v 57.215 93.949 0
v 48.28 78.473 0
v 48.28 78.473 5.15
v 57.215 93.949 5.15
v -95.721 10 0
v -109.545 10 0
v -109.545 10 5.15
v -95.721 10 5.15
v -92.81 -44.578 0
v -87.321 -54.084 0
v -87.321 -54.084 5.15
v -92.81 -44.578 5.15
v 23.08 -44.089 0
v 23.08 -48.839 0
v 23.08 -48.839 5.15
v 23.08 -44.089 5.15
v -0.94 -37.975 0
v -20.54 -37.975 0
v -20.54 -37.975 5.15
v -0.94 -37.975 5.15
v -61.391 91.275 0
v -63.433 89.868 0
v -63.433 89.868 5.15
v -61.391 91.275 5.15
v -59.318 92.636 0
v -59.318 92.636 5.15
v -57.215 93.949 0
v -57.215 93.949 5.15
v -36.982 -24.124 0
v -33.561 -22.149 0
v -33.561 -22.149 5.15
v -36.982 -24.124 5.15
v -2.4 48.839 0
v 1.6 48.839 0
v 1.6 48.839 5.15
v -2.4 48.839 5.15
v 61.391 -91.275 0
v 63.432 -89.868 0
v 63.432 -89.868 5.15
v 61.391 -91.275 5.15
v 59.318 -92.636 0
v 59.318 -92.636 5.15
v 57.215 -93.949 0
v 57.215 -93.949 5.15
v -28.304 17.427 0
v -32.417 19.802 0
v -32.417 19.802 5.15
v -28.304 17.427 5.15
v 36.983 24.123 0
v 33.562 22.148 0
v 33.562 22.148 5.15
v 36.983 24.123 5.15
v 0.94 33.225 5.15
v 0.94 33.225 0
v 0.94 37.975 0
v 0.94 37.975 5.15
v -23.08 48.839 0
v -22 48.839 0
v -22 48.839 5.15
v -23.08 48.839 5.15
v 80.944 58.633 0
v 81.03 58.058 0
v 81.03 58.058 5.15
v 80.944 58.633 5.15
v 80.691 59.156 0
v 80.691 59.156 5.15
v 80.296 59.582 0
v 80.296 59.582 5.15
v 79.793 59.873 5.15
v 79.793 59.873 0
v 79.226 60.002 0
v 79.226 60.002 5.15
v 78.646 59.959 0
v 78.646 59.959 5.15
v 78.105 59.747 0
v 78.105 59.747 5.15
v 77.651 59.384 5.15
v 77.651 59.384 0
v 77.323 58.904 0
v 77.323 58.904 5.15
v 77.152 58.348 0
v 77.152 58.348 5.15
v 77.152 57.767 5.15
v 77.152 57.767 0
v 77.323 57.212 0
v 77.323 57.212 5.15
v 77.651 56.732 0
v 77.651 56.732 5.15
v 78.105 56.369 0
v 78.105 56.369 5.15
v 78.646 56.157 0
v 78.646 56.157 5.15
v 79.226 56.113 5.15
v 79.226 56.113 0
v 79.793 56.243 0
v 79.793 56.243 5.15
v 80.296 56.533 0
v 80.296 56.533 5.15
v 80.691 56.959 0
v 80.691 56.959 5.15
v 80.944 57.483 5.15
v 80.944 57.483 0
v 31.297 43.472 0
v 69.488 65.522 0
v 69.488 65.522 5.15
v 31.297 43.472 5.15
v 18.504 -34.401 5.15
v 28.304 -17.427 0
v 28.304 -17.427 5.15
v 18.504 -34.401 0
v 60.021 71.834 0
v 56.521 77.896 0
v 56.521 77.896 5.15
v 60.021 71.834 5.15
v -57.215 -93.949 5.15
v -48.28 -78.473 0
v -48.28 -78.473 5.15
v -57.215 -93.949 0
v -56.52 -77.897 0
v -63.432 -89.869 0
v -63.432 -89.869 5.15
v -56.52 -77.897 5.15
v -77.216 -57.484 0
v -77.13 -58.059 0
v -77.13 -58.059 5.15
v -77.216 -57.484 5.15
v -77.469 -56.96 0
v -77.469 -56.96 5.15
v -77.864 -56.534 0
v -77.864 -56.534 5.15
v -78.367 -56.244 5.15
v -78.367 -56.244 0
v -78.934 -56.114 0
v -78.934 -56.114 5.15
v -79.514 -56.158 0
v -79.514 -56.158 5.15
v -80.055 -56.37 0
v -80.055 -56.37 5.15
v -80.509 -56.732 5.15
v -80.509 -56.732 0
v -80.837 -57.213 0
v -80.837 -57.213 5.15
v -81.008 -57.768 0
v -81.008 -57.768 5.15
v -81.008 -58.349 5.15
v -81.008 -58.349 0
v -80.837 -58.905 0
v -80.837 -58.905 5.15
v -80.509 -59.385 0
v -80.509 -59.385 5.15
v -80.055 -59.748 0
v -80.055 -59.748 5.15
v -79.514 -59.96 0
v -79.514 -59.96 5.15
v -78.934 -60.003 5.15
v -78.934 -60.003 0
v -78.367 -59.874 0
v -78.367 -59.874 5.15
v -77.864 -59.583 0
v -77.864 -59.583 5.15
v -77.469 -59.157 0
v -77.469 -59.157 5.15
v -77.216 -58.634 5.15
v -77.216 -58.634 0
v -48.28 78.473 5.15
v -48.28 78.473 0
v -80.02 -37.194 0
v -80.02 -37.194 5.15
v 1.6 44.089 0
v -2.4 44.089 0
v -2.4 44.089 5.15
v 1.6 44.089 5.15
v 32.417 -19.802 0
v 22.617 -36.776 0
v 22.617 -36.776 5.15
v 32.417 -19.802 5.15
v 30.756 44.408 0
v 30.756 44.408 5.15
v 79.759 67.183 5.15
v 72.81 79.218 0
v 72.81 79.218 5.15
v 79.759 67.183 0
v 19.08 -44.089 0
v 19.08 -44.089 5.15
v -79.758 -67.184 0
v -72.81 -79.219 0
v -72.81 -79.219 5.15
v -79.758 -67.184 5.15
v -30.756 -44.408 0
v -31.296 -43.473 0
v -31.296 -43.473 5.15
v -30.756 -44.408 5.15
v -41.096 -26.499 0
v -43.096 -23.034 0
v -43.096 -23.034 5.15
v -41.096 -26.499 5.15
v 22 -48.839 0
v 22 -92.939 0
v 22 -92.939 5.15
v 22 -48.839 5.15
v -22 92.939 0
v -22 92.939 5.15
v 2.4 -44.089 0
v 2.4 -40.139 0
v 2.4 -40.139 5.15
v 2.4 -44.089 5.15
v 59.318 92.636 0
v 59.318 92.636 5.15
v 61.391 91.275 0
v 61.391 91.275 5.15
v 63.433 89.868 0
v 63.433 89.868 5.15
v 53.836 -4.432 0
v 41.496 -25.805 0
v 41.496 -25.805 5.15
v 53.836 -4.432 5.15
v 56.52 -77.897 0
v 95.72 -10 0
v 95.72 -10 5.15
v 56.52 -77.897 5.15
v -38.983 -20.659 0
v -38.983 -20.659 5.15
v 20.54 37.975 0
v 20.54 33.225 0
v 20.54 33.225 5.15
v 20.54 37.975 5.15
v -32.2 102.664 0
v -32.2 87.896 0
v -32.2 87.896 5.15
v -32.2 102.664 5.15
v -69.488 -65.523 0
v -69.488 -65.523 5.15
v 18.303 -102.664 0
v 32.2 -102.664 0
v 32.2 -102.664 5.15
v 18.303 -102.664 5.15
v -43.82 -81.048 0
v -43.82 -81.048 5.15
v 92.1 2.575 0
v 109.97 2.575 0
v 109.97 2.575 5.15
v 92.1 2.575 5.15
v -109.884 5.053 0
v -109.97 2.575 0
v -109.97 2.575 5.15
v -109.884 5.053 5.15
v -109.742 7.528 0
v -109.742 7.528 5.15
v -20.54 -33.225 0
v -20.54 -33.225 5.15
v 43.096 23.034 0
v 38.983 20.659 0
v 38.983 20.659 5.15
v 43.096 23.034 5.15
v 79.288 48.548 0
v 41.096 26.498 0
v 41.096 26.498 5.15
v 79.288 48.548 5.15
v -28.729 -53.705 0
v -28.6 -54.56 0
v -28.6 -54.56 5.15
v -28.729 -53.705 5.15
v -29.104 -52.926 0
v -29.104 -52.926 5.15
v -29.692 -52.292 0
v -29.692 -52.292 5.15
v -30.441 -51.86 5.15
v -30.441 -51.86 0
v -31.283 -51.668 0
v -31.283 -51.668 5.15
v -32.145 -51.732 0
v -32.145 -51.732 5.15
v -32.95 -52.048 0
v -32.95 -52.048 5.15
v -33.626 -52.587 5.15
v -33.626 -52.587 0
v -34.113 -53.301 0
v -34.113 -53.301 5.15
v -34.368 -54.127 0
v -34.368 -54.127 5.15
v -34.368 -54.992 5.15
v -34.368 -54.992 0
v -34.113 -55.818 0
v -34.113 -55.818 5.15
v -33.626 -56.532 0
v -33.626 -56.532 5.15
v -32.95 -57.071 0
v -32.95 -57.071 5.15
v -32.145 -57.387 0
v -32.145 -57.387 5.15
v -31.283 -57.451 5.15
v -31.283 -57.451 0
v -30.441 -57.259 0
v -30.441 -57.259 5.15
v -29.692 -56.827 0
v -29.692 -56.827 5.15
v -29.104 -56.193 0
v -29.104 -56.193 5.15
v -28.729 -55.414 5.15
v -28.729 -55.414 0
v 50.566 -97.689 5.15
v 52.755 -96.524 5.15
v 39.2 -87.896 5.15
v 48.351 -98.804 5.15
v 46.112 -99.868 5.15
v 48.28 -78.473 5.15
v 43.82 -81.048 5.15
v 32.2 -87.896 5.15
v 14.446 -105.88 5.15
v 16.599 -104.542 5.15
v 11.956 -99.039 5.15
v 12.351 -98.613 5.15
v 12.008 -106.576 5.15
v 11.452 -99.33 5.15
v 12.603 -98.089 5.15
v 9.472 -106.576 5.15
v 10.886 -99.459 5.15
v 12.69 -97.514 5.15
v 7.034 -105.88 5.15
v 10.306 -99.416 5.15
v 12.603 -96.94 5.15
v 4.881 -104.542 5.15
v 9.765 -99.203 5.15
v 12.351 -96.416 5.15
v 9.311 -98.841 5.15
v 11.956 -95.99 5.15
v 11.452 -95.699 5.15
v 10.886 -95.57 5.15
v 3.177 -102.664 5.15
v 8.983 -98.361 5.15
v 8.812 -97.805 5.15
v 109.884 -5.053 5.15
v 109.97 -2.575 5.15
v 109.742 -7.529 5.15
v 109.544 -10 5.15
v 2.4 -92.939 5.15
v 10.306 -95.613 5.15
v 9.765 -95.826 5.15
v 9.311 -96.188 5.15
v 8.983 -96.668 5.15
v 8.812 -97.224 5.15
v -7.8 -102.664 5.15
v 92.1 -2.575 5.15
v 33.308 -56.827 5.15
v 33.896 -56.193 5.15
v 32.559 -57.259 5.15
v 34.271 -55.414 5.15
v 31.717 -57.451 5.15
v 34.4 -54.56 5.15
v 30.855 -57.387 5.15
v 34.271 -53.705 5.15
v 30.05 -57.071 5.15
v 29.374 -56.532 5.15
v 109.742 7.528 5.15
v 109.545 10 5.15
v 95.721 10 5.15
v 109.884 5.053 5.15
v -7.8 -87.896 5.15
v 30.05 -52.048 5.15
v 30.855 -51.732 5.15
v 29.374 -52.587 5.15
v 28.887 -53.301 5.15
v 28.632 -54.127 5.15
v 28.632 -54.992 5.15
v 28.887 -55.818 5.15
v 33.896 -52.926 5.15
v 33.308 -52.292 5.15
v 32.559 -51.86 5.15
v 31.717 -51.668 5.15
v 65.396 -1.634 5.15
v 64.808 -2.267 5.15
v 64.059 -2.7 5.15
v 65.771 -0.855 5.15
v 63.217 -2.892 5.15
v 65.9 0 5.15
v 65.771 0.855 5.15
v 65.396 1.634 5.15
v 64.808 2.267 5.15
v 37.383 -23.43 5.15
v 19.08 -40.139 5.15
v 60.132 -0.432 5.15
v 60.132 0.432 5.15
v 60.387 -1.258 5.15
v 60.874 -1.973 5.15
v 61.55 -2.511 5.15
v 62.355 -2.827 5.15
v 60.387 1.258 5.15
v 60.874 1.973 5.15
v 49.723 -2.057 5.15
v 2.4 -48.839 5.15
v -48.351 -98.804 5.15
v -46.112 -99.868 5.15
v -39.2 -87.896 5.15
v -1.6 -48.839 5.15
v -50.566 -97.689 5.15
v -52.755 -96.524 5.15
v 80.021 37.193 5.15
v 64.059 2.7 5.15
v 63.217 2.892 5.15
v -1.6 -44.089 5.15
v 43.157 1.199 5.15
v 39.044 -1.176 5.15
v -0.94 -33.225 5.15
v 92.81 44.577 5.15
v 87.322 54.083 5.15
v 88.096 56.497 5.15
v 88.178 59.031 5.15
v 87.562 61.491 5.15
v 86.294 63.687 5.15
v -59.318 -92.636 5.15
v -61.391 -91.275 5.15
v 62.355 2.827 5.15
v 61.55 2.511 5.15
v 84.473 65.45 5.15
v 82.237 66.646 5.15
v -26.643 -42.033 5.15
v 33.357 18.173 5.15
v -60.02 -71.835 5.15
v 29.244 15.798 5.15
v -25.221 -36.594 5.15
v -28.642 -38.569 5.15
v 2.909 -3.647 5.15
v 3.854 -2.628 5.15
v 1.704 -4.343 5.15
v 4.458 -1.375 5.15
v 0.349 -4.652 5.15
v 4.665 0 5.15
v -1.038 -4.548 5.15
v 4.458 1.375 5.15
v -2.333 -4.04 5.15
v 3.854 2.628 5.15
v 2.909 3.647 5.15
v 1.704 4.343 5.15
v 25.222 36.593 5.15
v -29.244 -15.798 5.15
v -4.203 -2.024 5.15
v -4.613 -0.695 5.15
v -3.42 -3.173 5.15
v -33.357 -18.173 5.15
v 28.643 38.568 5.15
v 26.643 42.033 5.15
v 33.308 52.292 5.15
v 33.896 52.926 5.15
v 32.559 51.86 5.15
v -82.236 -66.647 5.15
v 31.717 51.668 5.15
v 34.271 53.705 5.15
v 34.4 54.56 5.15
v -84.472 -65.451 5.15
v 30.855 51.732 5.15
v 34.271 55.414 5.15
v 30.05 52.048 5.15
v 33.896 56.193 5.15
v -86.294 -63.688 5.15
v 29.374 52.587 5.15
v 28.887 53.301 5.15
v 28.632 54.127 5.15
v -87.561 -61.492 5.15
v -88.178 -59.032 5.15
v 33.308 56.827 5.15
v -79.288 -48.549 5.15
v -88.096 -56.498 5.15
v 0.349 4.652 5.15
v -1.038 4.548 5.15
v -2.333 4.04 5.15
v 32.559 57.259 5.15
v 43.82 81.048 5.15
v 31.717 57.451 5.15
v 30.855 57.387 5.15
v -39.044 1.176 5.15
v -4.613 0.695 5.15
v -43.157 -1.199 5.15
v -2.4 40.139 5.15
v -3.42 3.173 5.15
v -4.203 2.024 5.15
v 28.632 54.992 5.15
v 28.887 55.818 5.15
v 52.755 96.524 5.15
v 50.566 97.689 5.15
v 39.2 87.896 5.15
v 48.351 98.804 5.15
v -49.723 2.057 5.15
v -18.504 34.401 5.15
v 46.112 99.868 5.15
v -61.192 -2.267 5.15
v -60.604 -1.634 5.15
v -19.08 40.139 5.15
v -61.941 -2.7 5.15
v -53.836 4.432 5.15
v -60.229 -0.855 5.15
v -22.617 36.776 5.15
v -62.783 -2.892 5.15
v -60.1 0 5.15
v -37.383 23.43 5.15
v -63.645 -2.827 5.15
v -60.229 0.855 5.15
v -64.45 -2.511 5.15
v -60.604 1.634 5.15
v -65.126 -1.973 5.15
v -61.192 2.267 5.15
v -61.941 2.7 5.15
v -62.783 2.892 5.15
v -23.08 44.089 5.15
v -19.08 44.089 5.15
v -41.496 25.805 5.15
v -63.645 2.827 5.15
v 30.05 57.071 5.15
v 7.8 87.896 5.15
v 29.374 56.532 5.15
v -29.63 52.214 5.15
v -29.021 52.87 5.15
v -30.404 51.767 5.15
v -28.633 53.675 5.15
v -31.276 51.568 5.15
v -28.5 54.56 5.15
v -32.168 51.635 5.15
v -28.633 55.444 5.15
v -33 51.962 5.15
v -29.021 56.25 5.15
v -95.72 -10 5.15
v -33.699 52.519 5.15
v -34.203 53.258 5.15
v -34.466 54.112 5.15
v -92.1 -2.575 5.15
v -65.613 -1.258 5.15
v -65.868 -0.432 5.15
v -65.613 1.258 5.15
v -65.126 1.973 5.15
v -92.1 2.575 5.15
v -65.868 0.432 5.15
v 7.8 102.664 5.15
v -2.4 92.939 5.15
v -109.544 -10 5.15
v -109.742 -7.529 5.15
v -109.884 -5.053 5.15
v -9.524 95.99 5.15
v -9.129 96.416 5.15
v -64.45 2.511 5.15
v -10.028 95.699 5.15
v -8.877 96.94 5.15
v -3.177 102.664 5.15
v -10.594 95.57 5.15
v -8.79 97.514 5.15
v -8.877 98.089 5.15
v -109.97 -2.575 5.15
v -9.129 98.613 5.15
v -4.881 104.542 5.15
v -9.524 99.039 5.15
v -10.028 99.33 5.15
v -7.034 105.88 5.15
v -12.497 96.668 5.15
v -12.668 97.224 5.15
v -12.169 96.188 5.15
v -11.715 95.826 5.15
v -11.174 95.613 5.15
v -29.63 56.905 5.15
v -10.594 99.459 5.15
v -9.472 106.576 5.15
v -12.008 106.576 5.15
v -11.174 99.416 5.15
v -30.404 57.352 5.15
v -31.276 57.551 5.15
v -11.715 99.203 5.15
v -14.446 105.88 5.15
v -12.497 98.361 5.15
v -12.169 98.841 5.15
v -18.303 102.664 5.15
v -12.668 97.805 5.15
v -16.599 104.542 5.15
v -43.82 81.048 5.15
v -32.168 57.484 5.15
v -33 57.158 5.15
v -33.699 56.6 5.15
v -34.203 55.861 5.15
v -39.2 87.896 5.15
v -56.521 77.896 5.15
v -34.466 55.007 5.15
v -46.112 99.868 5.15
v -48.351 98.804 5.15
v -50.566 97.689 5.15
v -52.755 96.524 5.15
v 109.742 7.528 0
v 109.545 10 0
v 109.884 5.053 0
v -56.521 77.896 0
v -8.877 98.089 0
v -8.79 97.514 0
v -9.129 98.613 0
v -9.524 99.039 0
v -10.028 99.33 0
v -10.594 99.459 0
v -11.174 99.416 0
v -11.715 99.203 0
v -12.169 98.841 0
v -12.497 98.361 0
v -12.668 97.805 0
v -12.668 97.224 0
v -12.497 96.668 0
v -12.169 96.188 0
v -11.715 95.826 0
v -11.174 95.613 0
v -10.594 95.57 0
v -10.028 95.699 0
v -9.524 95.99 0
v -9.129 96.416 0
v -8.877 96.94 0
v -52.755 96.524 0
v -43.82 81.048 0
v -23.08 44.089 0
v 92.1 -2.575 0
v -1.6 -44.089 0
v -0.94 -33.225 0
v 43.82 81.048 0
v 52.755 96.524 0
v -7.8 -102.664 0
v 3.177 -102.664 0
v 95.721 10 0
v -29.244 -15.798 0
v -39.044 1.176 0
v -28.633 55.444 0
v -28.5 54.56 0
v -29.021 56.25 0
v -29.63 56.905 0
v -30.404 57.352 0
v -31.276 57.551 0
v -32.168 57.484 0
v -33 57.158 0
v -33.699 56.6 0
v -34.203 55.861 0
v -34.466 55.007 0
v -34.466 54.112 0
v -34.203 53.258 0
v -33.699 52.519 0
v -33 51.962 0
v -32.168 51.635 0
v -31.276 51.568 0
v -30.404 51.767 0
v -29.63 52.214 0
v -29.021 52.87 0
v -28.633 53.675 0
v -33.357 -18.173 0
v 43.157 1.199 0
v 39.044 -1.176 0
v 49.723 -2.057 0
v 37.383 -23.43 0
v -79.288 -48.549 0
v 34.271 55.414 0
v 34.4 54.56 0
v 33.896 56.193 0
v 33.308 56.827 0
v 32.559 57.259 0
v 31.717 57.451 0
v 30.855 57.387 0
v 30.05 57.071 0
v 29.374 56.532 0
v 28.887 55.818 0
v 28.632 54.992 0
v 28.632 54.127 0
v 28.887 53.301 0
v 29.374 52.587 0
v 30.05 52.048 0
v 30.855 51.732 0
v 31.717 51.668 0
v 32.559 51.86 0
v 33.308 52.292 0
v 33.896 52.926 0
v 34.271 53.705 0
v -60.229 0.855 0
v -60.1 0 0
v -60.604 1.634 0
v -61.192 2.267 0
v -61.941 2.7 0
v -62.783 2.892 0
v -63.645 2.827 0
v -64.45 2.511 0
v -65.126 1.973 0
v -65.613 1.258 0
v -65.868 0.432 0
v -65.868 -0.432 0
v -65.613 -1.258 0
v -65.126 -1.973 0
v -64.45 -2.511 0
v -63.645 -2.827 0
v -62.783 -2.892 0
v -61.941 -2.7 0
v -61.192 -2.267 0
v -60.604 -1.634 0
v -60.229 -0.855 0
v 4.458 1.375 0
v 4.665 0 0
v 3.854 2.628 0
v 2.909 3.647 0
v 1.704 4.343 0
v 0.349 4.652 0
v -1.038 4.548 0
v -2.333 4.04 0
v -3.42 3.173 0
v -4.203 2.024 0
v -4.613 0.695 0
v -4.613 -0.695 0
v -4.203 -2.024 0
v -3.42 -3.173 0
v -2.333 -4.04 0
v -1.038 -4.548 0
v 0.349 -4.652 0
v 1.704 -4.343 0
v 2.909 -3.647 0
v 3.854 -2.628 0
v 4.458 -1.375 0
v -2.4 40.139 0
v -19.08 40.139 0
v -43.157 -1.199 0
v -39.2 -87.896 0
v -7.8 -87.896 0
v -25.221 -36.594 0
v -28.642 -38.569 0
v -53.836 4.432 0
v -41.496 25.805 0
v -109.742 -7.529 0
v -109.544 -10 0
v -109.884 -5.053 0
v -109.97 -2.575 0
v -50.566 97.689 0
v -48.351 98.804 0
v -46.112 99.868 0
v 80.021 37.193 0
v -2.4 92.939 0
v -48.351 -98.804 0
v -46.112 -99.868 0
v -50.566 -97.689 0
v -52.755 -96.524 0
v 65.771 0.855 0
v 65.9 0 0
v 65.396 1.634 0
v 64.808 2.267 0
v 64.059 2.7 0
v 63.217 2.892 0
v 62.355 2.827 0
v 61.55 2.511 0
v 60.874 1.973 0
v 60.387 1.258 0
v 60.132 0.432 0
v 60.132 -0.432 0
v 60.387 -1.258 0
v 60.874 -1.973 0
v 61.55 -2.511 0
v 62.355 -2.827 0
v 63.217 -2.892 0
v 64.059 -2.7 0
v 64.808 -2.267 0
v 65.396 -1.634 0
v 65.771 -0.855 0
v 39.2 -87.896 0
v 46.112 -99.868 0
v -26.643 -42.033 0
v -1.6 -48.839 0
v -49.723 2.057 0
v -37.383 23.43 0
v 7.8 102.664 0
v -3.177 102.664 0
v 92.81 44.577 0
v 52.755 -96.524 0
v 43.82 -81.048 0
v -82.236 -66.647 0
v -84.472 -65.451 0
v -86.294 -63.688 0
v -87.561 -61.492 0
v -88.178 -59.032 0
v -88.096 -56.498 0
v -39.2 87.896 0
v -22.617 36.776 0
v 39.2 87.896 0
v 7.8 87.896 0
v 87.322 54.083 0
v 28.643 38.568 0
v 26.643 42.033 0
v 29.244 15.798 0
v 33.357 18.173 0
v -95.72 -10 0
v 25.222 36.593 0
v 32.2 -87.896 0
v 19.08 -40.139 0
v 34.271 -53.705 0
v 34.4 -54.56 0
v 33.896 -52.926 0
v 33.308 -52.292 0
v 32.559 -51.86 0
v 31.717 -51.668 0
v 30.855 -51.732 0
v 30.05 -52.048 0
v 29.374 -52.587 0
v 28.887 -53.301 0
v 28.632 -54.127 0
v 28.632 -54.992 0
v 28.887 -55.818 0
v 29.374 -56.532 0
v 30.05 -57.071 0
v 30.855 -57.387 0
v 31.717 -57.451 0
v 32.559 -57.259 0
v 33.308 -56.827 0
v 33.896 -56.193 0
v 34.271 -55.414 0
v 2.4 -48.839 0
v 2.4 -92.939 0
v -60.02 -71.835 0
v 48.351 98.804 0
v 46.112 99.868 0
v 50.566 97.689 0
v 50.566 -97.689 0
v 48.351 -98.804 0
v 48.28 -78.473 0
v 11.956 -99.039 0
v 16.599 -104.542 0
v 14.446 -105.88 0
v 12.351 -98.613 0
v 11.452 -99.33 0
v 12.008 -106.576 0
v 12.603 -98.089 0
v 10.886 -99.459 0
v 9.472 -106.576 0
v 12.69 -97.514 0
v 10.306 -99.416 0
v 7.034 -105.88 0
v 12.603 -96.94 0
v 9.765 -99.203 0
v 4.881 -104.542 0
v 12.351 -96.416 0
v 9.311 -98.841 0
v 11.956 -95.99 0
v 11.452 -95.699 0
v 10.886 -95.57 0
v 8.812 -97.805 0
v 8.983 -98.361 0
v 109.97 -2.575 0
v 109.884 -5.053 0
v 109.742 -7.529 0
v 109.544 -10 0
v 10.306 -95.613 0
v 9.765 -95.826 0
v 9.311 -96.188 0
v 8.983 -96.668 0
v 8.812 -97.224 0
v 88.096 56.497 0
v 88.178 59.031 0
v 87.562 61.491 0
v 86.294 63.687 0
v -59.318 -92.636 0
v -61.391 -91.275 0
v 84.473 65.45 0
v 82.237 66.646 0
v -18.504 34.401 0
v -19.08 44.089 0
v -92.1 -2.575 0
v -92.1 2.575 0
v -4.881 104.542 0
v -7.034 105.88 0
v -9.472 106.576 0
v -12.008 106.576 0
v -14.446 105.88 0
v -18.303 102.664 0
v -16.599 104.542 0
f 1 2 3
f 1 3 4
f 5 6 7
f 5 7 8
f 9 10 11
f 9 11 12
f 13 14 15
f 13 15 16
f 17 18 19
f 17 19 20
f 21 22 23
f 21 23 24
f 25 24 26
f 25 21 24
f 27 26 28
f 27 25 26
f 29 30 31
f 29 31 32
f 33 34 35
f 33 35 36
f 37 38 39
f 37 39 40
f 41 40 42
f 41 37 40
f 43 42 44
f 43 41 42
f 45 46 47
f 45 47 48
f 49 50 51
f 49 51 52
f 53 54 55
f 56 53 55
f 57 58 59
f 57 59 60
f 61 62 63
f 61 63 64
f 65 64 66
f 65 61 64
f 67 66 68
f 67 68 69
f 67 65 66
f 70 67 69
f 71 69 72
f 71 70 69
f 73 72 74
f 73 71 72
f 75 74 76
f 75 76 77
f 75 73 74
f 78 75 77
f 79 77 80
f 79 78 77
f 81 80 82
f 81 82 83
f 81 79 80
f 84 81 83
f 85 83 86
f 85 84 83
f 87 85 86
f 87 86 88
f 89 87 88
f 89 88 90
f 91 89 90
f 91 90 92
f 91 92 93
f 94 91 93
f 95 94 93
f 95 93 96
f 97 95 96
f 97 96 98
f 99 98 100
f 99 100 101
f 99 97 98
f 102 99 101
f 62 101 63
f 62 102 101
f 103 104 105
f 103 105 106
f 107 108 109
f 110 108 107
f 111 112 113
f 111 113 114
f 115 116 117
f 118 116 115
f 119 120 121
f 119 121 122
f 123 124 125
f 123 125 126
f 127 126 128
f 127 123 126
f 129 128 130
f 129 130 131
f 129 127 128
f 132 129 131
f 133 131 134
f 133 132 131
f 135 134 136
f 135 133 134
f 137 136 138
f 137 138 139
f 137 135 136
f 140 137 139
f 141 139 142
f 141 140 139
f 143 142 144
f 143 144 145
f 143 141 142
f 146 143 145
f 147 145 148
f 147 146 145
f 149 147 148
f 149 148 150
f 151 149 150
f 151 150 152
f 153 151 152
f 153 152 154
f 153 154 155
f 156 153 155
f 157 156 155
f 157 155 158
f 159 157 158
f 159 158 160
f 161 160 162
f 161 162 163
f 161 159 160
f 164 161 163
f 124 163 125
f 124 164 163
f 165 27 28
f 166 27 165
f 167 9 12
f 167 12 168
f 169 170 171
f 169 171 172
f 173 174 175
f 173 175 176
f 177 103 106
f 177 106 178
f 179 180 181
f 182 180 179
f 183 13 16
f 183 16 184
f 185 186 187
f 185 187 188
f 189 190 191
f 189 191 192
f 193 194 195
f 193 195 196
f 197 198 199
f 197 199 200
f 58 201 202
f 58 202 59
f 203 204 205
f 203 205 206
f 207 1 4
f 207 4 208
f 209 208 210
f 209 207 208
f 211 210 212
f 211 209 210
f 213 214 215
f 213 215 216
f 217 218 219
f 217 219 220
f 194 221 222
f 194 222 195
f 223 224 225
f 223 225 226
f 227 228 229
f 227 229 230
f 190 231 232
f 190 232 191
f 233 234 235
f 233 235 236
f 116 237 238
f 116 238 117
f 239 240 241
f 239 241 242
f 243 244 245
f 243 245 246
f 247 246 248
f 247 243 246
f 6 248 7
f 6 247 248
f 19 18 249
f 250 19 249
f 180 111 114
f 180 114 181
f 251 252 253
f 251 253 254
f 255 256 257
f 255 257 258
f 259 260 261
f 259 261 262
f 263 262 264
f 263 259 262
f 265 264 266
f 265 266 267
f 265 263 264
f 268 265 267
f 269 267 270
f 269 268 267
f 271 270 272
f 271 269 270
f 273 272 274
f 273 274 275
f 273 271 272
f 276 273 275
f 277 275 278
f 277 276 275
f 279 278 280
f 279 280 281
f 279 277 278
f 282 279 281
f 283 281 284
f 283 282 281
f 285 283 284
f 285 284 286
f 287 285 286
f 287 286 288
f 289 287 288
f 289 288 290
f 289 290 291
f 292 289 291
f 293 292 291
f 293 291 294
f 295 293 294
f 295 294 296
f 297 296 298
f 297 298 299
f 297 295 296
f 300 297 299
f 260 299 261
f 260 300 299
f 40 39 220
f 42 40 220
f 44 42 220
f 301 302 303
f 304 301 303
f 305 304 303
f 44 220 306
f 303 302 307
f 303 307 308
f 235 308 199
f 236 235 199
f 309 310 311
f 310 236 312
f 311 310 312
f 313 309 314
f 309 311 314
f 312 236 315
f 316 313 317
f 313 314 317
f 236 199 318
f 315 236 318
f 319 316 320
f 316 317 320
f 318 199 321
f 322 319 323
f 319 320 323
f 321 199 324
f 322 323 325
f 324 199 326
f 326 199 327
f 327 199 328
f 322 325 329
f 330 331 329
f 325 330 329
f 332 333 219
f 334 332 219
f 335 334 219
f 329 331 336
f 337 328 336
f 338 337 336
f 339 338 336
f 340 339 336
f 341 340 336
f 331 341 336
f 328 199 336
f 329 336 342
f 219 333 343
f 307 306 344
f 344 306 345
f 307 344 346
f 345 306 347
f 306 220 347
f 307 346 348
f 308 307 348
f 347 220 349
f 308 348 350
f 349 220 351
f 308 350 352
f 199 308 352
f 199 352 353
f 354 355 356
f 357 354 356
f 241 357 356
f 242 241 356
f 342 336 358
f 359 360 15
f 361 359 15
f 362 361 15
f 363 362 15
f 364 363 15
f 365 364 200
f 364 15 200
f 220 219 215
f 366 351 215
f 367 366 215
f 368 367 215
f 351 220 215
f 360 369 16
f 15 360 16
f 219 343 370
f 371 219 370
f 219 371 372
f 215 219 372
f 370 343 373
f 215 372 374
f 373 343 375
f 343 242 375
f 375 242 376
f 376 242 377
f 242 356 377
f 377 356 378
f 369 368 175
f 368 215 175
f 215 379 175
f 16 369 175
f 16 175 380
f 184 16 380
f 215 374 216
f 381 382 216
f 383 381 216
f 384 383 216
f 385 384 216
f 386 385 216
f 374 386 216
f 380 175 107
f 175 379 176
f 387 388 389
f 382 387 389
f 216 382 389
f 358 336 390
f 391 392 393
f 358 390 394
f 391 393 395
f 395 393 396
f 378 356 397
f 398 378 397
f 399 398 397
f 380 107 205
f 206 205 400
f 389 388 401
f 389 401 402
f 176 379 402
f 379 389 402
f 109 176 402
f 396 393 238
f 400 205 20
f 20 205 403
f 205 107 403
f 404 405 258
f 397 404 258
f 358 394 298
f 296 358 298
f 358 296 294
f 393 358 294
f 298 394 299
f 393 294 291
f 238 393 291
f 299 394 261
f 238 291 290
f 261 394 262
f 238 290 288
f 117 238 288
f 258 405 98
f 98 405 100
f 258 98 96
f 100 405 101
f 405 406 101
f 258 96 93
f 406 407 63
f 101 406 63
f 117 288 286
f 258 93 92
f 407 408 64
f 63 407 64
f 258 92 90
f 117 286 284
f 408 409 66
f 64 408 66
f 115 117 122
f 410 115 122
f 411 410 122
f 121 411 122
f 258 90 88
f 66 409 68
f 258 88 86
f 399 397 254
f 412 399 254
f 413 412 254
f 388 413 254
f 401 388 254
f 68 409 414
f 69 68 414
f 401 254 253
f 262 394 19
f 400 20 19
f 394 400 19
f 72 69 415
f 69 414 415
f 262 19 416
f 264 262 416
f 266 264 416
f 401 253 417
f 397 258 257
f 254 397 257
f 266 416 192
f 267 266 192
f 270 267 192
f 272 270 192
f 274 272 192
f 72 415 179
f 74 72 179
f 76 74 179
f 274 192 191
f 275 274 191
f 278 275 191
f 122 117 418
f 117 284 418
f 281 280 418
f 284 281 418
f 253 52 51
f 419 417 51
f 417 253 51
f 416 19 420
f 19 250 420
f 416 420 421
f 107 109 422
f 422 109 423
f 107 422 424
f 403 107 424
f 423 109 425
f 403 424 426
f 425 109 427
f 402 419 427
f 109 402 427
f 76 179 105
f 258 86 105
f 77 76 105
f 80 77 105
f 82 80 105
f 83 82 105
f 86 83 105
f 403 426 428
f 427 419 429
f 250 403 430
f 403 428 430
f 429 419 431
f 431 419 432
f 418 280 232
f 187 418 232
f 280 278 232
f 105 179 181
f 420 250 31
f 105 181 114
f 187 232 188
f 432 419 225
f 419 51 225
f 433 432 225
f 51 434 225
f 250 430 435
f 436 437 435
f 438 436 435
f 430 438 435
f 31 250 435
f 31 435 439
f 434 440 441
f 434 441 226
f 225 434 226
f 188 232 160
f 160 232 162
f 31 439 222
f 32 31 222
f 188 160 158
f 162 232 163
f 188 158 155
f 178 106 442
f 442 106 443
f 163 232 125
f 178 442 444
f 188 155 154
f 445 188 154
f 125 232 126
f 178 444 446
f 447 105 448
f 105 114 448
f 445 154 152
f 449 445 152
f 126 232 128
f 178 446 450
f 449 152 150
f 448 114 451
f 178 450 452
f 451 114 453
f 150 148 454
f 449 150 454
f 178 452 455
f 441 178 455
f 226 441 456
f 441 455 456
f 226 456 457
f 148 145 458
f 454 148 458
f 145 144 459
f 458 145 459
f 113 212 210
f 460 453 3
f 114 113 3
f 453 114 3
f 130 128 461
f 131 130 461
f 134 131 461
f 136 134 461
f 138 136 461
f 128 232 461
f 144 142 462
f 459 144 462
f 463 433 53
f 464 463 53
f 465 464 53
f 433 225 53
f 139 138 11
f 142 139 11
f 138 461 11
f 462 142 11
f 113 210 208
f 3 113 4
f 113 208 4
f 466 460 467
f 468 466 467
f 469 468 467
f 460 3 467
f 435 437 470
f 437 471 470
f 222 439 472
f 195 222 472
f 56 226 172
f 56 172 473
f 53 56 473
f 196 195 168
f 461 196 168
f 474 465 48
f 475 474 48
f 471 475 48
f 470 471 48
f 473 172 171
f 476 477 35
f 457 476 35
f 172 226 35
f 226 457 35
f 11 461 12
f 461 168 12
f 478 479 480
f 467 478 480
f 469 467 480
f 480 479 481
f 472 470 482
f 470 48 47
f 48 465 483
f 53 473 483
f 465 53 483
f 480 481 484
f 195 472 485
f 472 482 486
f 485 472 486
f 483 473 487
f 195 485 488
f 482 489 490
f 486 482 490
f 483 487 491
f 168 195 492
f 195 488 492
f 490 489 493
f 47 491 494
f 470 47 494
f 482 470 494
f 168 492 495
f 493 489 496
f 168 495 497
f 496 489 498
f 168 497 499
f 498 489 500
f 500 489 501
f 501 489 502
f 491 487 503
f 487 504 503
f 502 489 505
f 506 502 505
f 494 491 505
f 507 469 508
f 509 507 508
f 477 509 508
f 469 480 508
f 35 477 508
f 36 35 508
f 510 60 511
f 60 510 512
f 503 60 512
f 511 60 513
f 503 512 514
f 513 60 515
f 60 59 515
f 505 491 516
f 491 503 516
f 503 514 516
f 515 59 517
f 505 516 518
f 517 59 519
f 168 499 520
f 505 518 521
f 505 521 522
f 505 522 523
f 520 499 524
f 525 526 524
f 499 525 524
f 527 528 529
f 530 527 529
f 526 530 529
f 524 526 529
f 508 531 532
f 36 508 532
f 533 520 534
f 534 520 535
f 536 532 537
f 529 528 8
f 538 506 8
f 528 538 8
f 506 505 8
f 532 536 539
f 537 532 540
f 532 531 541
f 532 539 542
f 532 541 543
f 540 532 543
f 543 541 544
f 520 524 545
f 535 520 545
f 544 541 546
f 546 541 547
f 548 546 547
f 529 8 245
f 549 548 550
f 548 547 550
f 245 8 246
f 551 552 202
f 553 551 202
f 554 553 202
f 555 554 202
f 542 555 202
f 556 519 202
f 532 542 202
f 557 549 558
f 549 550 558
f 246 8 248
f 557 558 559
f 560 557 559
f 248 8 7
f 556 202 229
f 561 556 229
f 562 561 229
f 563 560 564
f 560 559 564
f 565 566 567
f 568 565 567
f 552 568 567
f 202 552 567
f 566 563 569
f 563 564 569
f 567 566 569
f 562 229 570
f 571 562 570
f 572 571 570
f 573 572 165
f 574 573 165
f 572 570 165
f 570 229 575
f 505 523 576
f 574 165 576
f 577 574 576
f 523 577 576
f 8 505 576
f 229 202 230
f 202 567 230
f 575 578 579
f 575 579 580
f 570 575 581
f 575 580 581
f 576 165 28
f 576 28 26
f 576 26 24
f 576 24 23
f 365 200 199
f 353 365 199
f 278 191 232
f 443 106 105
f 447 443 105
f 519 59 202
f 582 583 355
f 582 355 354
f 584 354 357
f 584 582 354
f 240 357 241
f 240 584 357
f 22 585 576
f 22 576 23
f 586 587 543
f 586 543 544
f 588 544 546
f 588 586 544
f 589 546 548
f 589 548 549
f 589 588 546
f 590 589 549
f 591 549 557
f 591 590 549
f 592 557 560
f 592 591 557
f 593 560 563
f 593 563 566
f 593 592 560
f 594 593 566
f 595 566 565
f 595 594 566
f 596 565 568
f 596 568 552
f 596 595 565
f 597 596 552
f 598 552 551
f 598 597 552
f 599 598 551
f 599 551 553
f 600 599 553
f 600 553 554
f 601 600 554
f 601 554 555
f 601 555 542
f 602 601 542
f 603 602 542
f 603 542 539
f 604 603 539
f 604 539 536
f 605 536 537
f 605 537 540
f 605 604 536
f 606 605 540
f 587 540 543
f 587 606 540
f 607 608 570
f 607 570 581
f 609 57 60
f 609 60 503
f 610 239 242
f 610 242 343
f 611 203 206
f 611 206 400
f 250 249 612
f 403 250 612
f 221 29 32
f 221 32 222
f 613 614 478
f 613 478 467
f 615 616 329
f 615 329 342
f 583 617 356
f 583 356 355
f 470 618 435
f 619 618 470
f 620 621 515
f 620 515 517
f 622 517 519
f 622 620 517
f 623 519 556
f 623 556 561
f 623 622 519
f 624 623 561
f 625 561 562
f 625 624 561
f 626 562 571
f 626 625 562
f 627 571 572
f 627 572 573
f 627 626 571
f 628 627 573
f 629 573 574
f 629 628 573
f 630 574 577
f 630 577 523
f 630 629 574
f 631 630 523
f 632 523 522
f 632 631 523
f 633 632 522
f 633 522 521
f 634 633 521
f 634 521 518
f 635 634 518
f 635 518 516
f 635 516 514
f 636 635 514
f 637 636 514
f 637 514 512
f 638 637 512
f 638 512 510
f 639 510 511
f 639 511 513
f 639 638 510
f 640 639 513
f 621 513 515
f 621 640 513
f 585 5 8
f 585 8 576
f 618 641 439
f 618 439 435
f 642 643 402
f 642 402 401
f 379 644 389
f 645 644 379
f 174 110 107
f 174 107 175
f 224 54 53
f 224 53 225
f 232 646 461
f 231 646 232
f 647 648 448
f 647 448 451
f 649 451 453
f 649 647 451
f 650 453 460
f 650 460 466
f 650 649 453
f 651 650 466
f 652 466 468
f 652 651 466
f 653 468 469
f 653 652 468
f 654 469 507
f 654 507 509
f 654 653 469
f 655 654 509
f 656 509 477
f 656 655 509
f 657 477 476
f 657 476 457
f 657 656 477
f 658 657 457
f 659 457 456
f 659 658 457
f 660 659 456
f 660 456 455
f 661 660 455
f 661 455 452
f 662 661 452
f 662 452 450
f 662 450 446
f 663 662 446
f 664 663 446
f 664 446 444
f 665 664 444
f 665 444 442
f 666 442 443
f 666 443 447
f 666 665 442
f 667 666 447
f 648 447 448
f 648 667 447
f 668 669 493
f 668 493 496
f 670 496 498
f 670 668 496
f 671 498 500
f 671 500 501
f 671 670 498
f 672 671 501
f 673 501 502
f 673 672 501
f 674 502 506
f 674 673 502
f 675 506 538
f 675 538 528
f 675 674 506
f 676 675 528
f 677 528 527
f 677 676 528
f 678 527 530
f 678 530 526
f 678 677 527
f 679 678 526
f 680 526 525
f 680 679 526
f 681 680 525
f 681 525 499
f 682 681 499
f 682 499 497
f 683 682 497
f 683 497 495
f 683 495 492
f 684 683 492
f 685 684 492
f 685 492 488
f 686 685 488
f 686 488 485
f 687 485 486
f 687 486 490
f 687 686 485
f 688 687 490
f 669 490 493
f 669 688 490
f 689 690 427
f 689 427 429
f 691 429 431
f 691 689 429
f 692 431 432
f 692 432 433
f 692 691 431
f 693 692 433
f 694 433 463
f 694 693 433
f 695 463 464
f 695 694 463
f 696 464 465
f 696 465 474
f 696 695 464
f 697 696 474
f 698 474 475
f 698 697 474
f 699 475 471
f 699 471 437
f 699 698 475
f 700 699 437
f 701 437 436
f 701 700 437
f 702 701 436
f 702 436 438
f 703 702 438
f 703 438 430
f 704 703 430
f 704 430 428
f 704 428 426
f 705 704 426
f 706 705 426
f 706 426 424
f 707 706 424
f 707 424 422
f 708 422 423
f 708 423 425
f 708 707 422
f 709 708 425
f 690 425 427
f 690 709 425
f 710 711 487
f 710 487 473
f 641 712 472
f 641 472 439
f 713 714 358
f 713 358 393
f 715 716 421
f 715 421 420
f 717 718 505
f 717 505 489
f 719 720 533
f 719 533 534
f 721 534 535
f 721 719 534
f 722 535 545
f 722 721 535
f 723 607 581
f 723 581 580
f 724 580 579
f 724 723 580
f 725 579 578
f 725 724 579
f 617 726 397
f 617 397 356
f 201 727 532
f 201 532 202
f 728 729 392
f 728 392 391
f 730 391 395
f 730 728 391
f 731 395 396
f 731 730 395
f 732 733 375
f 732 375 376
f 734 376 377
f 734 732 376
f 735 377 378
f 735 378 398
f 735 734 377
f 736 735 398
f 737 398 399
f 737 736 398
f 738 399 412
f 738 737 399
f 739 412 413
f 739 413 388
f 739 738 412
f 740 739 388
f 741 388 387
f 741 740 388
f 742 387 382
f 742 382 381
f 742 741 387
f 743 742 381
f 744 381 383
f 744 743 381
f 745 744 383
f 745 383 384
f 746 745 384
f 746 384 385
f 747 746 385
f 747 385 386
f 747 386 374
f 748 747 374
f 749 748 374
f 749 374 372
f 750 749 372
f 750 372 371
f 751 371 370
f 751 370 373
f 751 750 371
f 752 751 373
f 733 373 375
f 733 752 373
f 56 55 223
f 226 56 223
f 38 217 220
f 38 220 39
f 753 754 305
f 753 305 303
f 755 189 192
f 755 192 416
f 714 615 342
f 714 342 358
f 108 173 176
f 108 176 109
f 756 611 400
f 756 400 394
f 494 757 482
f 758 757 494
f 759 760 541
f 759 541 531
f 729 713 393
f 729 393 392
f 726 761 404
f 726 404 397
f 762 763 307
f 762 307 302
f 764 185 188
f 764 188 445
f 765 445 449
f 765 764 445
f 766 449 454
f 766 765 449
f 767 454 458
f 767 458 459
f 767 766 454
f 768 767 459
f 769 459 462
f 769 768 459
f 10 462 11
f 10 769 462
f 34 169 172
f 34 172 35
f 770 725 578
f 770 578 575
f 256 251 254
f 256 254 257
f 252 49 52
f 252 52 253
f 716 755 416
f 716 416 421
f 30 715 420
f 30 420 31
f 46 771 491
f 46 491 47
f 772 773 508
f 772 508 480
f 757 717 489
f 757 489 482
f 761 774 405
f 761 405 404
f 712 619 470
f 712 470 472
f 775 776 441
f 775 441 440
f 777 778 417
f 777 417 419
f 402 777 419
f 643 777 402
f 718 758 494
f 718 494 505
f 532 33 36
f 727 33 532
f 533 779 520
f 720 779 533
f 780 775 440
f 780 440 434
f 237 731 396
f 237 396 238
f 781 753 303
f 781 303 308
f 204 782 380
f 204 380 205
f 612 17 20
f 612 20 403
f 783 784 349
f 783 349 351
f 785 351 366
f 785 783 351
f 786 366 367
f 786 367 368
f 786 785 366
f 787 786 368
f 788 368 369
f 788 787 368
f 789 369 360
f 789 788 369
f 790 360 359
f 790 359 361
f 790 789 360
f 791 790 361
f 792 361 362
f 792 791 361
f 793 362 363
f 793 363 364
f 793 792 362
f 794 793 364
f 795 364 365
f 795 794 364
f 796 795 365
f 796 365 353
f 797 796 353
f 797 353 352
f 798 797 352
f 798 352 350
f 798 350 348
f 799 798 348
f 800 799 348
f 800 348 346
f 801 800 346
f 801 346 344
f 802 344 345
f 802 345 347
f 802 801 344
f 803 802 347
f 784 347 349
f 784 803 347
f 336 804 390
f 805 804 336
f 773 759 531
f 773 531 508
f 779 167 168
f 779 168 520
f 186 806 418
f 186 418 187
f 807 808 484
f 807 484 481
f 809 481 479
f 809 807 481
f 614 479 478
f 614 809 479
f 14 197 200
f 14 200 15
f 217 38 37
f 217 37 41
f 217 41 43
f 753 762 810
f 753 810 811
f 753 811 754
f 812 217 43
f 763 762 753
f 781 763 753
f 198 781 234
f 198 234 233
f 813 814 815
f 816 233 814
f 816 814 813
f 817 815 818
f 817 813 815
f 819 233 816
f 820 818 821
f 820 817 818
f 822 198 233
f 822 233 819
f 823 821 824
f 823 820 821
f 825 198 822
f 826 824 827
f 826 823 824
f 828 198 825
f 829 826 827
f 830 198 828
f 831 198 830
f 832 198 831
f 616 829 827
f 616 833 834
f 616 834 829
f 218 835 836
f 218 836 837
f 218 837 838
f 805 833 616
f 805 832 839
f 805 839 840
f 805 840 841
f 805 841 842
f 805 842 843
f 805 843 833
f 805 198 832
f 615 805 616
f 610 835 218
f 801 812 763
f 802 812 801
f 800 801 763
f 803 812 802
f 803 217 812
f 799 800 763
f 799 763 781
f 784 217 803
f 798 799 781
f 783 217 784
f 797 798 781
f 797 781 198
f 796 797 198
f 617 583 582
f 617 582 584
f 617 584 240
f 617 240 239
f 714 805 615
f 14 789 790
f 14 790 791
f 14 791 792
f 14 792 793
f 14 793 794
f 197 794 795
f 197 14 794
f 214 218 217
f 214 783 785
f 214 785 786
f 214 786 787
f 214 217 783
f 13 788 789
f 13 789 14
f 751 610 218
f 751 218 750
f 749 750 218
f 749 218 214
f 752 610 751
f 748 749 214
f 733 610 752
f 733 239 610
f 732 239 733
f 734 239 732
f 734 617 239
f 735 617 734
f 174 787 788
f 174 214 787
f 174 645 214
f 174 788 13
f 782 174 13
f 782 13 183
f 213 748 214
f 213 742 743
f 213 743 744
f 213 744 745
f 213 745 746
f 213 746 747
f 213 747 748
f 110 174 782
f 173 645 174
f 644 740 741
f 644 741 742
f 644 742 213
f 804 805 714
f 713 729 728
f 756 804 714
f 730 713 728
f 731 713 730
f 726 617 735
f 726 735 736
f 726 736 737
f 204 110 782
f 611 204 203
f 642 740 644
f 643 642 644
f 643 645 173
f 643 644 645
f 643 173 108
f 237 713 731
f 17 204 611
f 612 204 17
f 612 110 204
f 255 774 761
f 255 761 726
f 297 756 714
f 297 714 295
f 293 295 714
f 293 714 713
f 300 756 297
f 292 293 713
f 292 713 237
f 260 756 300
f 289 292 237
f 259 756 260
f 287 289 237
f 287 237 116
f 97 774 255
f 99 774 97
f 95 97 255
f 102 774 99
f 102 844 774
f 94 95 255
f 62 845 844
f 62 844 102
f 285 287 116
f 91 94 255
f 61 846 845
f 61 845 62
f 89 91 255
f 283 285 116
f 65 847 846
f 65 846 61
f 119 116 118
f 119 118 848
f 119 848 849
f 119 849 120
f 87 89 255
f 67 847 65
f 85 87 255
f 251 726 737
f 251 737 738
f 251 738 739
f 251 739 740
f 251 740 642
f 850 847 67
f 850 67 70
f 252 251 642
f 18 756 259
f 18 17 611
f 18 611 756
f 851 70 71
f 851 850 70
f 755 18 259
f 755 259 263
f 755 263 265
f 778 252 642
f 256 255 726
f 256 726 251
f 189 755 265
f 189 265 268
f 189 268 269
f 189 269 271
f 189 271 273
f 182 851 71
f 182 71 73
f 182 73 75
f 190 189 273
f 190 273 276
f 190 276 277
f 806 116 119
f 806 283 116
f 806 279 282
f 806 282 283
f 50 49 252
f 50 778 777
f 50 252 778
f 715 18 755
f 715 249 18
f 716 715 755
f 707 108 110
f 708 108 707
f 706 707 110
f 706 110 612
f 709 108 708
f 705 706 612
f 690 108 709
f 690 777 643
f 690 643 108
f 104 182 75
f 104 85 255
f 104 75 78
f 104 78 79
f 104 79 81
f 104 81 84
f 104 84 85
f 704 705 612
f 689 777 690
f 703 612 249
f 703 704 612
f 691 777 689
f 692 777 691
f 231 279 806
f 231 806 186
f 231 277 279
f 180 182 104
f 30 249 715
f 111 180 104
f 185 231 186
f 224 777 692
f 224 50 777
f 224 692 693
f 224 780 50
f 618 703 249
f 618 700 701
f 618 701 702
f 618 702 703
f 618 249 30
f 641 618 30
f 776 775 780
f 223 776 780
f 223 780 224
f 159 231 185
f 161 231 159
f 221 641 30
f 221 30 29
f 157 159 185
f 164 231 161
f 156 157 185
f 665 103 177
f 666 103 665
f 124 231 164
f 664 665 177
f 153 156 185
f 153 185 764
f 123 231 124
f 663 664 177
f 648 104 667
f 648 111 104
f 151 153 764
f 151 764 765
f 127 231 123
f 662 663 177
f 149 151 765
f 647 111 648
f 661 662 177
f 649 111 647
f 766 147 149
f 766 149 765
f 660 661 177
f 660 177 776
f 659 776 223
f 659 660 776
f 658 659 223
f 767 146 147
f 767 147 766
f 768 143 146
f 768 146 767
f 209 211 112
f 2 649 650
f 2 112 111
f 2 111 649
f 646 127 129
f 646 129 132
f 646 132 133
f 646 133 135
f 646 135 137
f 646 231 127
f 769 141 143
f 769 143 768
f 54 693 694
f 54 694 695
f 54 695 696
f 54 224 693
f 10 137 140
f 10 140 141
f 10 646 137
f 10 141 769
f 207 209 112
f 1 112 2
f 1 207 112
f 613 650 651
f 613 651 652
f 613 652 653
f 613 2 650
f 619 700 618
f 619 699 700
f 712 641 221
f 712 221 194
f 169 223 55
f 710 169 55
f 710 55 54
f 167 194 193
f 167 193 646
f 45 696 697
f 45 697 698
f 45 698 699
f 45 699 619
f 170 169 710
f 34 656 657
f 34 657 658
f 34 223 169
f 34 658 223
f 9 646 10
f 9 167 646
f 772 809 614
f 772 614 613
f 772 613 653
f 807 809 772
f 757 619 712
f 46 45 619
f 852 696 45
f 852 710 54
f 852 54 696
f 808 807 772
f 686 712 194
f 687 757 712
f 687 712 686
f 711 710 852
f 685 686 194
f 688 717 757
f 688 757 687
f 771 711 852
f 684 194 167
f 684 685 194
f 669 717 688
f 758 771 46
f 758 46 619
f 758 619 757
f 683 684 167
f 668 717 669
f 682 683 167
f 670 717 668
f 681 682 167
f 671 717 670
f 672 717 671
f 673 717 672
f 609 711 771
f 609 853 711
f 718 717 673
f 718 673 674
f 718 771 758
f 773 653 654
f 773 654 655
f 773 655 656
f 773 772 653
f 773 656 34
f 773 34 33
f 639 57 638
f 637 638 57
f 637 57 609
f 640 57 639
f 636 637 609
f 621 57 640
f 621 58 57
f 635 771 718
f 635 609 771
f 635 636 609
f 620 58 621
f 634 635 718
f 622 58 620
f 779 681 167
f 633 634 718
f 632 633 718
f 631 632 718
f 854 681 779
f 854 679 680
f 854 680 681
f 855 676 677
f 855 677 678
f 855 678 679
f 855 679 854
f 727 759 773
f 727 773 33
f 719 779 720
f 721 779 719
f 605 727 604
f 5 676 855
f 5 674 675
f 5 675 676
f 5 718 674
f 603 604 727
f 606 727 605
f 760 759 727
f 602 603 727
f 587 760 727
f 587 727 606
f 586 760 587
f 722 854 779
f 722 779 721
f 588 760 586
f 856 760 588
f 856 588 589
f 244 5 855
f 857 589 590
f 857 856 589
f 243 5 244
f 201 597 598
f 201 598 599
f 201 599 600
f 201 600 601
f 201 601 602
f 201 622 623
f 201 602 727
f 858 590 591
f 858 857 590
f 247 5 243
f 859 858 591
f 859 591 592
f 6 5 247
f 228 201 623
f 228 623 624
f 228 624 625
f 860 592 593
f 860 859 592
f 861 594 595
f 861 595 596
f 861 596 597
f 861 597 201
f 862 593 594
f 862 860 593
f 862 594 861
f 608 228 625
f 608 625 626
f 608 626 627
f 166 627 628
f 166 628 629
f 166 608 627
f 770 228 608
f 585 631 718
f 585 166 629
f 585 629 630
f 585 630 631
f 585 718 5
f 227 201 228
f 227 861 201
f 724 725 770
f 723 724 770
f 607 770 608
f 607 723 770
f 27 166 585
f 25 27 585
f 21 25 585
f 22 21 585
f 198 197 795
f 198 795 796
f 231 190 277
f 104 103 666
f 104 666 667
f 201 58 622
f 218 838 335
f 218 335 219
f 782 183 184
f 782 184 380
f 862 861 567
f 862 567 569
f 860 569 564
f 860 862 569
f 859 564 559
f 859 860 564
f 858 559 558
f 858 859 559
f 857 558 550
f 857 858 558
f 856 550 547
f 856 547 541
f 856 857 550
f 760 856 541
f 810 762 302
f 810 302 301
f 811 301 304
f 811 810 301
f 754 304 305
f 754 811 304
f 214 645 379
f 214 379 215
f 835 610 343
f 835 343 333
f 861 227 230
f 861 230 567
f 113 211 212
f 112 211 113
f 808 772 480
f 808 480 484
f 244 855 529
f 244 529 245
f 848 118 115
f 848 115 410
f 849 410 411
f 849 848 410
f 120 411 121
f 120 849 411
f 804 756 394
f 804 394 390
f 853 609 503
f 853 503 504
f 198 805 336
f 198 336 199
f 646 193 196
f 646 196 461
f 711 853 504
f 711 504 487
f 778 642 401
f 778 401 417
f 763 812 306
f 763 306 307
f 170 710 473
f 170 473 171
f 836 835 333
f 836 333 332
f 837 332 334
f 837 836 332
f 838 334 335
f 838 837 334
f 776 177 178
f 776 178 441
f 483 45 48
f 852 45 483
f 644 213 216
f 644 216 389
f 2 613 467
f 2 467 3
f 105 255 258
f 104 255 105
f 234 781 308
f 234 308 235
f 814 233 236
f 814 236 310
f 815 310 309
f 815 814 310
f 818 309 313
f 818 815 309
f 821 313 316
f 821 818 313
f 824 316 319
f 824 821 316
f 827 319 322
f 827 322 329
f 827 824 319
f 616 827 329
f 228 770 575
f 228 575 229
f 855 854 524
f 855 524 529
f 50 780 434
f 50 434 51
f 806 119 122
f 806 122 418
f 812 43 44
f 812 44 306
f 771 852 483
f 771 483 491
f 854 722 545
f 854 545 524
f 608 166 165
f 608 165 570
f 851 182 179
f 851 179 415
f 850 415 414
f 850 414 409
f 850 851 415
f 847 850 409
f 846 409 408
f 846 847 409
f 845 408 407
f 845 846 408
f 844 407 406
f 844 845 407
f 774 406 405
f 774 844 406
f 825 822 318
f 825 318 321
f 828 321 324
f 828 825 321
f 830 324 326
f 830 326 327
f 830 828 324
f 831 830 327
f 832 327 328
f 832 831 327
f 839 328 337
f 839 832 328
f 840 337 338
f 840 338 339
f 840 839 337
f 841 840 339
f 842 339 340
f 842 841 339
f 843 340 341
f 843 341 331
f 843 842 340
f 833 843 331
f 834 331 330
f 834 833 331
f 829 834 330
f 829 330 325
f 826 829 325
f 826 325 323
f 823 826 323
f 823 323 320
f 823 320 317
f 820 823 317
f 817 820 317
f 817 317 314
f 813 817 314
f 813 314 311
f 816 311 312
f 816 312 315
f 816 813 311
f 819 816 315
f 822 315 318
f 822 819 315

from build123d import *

# Parameters (mm, degrees)
MODEL_R             = 2.9
MODEL_R_2           = 3
MODEL_R_3           = 1.95
MODEL_R_4           = 4.665
MODEL_W             = 19.6
MODEL_H             = 4.75
BOSS_EXTRUDE1_DEPTH = 5.15


with BuildPart() as part:
    # Model → Boss-Extrude1 (new body)
    with BuildSketch(Plane.XY):
        with BuildLine():
            Line((43.819984585, 81.048439688), (48.280015415, 78.473439688))
            Line((48.280015415, 78.473439688), (57.214943747, 93.949189523))
            ThreePointArc((57.214943747, 93.949189523), (60.358438208, 91.961181686), (63.432925851, 89.868036131))
            Line((63.432925851, 89.868036131), (56.520818931, 77.895915758))
            Line((56.520818931, 77.895915758), (60.020818931, 71.833737931))
            Line((60.020818931, 71.833737931), (72.810336239, 79.217769192))
            Line((72.810336239, 79.217769192), (79.758802159, 67.182673184))
            ThreePointArc((79.758802159, 67.182673184), (87.004437854, 62.632864027), (87.321870319, 54.083054869))
            Line((87.321870319, 54.083054869), (92.810336239, 44.57675304))
            Line((92.810336239, 44.57675304), (80.020818931, 37.19272178))
            Line((80.020818931, 37.19272178), (95.720818931, 9.999524101))
            Line((95.720818931, 9.999524101), (109.544554943, 9.999524101))
            ThreePointArc((109.544554943, 9.999524101), (109.819966834, 6.290857214), (109.969856665, 2.575))
            Line((109.969856665, 2.575), (92.1, 2.575))
            Line((92.1, 2.575), (92.1, -2.575))
            Line((92.1, -2.575), (109.969856665, -2.575))
            ThreePointArc((109.969856665, -2.575), (109.819947856, -6.291188516), (109.544494609, -10.000185045))
            Line((109.544494609, -10.000185045), (95.720280769, -10.000185045))
            Line((95.720280769, -10.000185045), (56.520280769, -77.896576702))
            Line((56.520280769, -77.896576702), (63.432272389, -89.86849737))
            ThreePointArc((63.432272389, -89.86849737), (60.358103868, -91.961401128), (57.214943747, -93.949189523))
            Line((57.214943747, -93.949189523), (48.280015415, -78.473439688))
            Line((48.280015415, -78.473439688), (43.819984585, -81.048439688))
            Line((43.819984585, -81.048439688), (52.754912918, -96.524189523))
            ThreePointArc((52.754912918, -96.524189523), (49.461727838, -98.252417168), (46.112001713, -99.868329805))
            Line((46.112001713, -99.868329805), (39.2, -87.896391657))
            Line((39.2, -87.896391657), (32.2, -87.896391657))
            Line((32.2, -87.896391657), (32.2, -102.664454178))
            Line((32.2, -102.664454178), (18.303068161, -102.664454178))
            ThreePointArc((18.303068161, -102.664454178), (10.74, -106.664454178), (3.17693184, -102.664454178))
            Line((3.17693184, -102.664454178), (-7.8, -102.664454178))
            Line((-7.8, -102.664454178), (-7.8, -87.896391657))
            Line((-7.8, -87.896391657), (-39.2, -87.896391657))
            Line((-39.2, -87.896391657), (-46.112001713, -99.868329805))
            ThreePointArc((-46.112001713, -99.868329805), (-49.461727838, -98.252417168), (-52.754912918, -96.524189523))
            Line((-52.754912918, -96.524189523), (-43.819984585, -81.048439689))
            Line((-43.819984585, -81.048439689), (-48.280015415, -78.473439689))
            Line((-48.280015415, -78.473439689), (-57.214943747, -93.949189523))
            ThreePointArc((-57.214943747, -93.949189523), (-60.358012455, -91.961461126), (-63.432093724, -89.868623478))
            Line((-63.432093724, -89.868623478), (-56.52019722, -77.896867556))
            Line((-56.52019722, -77.896867556), (-60.02019722, -71.834689729))
            Line((-60.02019722, -71.834689729), (-72.809714528, -79.218720989))
            Line((-72.809714528, -79.218720989), (-79.758180447, -67.183624982))
            ThreePointArc((-79.758180447, -67.183624982), (-87.003816143, -62.633815824), (-87.321248608, -54.084006667))
            Line((-87.321248608, -54.084006667), (-92.809714528, -44.577704838))
            Line((-92.809714528, -44.577704838), (-80.02019722, -37.193673578))
            Line((-80.02019722, -37.193673578), (-95.72019722, -10.000475899))
            Line((-95.72019722, -10.000475899), (-109.544468057, -10.000475899))
            ThreePointArc((-109.544468057, -10.000475899), (-109.819939504, -6.291334309), (-109.969856665, -2.575))
            Line((-109.969856665, -2.575), (-92.1, -2.575))
            Line((-92.1, -2.575), (-92.1, 2.575))
            Line((-92.1, 2.575), (-109.969856665, 2.575))
            ThreePointArc((-109.969856665, 2.575), (-109.819958483, 6.291003006), (-109.544528393, 9.999814955))
            Line((-109.544528393, 9.999814955), (-95.720735382, 9.999814955))
            Line((-95.720735382, 9.999814955), (-56.520735382, 77.896206612))
            Line((-56.520735382, 77.896206612), (-63.432747187, 89.86816224))
            ThreePointArc((-63.432747187, 89.86816224), (-60.358346795, 91.961241684), (-57.214943747, 93.949189523))
            Line((-57.214943747, 93.949189523), (-48.280015415, 78.473439689))
            Line((-48.280015415, 78.473439689), (-43.819984585, 81.048439689))
            Line((-43.819984585, 81.048439689), (-52.754912918, 96.524189523))
            ThreePointArc((-52.754912918, 96.524189523), (-49.461727838, 98.252417168), (-46.112001713, 99.868329805))
            Line((-46.112001713, 99.868329805), (-39.2, 87.896391657))
            Line((-39.2, 87.896391657), (-32.2, 87.896391657))
            Line((-32.2, 87.896391657), (-32.2, 102.664454178))
            Line((-32.2, 102.664454178), (-18.30306816, 102.664454178))
            ThreePointArc((-18.30306816, 102.664454178), (-10.74, 106.664454178), (-3.176931839, 102.664454178))
            Line((-3.176931839, 102.664454178), (7.8, 102.664454178))
            Line((7.8, 102.664454178), (7.8, 87.896391657))
            Line((7.8, 87.896391657), (39.2, 87.896391657))
            Line((39.2, 87.896391657), (46.112001713, 99.868329805))
            ThreePointArc((46.112001713, 99.868329805), (49.461727838, 98.252417168), (52.754912918, 96.524189523))
            Line((52.754912918, 96.524189523), (43.819984585, 81.048439688))
        make_face()
        with Locations((-63, 0)):
            Circle(MODEL_R, mode=Mode.SUBTRACT)
        with Locations((-31.5, -54.559600438)):
            Circle(MODEL_R, mode=Mode.SUBTRACT)
        with Locations((31.5, -54.559600438)):
            Circle(MODEL_R, mode=Mode.SUBTRACT)
        with Locations((63, 0)):
            Circle(MODEL_R, mode=Mode.SUBTRACT)
        with Locations((31.5, 54.559600438)):
            Circle(MODEL_R, mode=Mode.SUBTRACT)
        with Locations((-31.5, 54.559600438)):
            Circle(MODEL_R_2, mode=Mode.SUBTRACT)
        with Locations((-79.079683698, -58.058815824)):
            Circle(MODEL_R_3, mode=Mode.SUBTRACT)
        with Locations((79.08030541, 58.057864027)):
            Circle(MODEL_R_3, mode=Mode.SUBTRACT)
        Circle(MODEL_R_4, mode=Mode.SUBTRACT)
        with Locations((-10.74, 97.514454178)):
            Circle(MODEL_R_3, mode=Mode.SUBTRACT)
        with Locations((10.74, -97.514454178)):
            Circle(MODEL_R_3, mode=Mode.SUBTRACT)
        Polygon((33.357314709, 18.17343612), (29.243694041, 15.79843612), (39.043694041, -1.175661794), (43.157314709, 1.199338206), align=None, mode=Mode.SUBTRACT)
        Polygon((32.417314709, -19.80156388), (28.303694041, -17.42656388), (18.503694041, -34.400661794), (22.617314709, -36.775661794), align=None, mode=Mode.SUBTRACT)
        with Locations((-10.74, -35.6)):
            Rectangle(MODEL_W, MODEL_H, mode=Mode.SUBTRACT)
        Polygon((-33.357314709, -18.17343612), (-29.243694041, -15.79843612), (-39.043694041, 1.175661794), (-43.157314709, -1.199338206), align=None, mode=Mode.SUBTRACT)
        Polygon((-32.417314709, 19.80156388), (-28.303694041, 17.42656388), (-18.503694041, 34.400661794), (-22.617314709, 36.775661794), align=None, mode=Mode.SUBTRACT)
        Polygon((36.982871141, 24.122696529), (38.982587357, 20.659086443), (43.096208025, 23.034086443), (41.096491809, 26.497696529), (79.288239187, 48.547712159), (69.488239187, 65.521810073), (31.296521386, 43.47181152), (30.75621053, 44.407594854), (26.642587357, 42.032593408), (28.642871141, 38.568000264), (25.222097867, 36.593015894), (33.562097867, 22.147712159), align=None, mode=Mode.SUBTRACT)
        Polygon((37.382587357, -23.430367735), (41.496208025, -25.805367735), (53.836208025, -4.431860769), (49.722587357, -2.056860769), align=None, mode=Mode.SUBTRACT)
        Polygon((2.4, -44.089454178), (-1.6, -44.089454178), (-1.6, -48.839454177), (2.4, -48.839454177), (2.4, -92.939454178), (22, -92.939454178), (22, -48.839454177), (23.08, -48.839454177), (23.08, -44.089454178), (19.08, -44.089454178), (19.08, -40.139454177), (2.4, -40.139454177), align=None, mode=Mode.SUBTRACT)
        Polygon((-36.982303573, -24.123679586), (-38.982587357, -20.659086443), (-43.096208025, -23.034086443), (-41.095924241, -26.498679586), (-79.287617476, -48.548663957), (-69.487617476, -65.522761871), (-31.295924241, -43.472777501), (-30.756208025, -44.407593408), (-26.642587357, -42.032593408), (-28.642303573, -38.568983322), (-25.221476156, -36.593967692), (-33.561476156, -22.148663957), align=None, mode=Mode.SUBTRACT)
        Polygon((-37.382587357, 23.430367735), (-41.496208025, 25.805367735), (-53.836208025, 4.431860769), (-49.722587357, 2.056860769), align=None, mode=Mode.SUBTRACT)
        with Locations((10.74, 35.6)):
            Rectangle(MODEL_W, MODEL_H, mode=Mode.SUBTRACT)
        Polygon((-2.4, 44.089454178), (1.6, 44.089454178), (1.6, 48.839454177), (-2.4, 48.839454177), (-2.4, 92.939454178), (-22, 92.939454178), (-22, 48.839454177), (-23.08, 48.839454177), (-23.08, 44.089454178), (-19.08, 44.089454178), (-19.08, 40.139454177), (-2.4, 40.139454177), align=None, mode=Mode.SUBTRACT)
    extrude(amount=BOSS_EXTRUDE1_DEPTH)


solid = part.part
